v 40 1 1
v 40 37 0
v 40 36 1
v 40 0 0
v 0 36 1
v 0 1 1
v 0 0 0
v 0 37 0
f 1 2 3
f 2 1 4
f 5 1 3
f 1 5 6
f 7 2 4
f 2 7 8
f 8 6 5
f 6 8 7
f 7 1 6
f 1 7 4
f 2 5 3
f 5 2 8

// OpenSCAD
difference() {
    cube([40,38,1]);
    translate([-1, 2, 2]){
        rotate([135,0,0]) {
            cube([44,4,5]);
        }
    }
    translate([-1, 38, -1]){
        rotate([45,0,0]) {
            cube([43,4,5]);
        }
    }
}
